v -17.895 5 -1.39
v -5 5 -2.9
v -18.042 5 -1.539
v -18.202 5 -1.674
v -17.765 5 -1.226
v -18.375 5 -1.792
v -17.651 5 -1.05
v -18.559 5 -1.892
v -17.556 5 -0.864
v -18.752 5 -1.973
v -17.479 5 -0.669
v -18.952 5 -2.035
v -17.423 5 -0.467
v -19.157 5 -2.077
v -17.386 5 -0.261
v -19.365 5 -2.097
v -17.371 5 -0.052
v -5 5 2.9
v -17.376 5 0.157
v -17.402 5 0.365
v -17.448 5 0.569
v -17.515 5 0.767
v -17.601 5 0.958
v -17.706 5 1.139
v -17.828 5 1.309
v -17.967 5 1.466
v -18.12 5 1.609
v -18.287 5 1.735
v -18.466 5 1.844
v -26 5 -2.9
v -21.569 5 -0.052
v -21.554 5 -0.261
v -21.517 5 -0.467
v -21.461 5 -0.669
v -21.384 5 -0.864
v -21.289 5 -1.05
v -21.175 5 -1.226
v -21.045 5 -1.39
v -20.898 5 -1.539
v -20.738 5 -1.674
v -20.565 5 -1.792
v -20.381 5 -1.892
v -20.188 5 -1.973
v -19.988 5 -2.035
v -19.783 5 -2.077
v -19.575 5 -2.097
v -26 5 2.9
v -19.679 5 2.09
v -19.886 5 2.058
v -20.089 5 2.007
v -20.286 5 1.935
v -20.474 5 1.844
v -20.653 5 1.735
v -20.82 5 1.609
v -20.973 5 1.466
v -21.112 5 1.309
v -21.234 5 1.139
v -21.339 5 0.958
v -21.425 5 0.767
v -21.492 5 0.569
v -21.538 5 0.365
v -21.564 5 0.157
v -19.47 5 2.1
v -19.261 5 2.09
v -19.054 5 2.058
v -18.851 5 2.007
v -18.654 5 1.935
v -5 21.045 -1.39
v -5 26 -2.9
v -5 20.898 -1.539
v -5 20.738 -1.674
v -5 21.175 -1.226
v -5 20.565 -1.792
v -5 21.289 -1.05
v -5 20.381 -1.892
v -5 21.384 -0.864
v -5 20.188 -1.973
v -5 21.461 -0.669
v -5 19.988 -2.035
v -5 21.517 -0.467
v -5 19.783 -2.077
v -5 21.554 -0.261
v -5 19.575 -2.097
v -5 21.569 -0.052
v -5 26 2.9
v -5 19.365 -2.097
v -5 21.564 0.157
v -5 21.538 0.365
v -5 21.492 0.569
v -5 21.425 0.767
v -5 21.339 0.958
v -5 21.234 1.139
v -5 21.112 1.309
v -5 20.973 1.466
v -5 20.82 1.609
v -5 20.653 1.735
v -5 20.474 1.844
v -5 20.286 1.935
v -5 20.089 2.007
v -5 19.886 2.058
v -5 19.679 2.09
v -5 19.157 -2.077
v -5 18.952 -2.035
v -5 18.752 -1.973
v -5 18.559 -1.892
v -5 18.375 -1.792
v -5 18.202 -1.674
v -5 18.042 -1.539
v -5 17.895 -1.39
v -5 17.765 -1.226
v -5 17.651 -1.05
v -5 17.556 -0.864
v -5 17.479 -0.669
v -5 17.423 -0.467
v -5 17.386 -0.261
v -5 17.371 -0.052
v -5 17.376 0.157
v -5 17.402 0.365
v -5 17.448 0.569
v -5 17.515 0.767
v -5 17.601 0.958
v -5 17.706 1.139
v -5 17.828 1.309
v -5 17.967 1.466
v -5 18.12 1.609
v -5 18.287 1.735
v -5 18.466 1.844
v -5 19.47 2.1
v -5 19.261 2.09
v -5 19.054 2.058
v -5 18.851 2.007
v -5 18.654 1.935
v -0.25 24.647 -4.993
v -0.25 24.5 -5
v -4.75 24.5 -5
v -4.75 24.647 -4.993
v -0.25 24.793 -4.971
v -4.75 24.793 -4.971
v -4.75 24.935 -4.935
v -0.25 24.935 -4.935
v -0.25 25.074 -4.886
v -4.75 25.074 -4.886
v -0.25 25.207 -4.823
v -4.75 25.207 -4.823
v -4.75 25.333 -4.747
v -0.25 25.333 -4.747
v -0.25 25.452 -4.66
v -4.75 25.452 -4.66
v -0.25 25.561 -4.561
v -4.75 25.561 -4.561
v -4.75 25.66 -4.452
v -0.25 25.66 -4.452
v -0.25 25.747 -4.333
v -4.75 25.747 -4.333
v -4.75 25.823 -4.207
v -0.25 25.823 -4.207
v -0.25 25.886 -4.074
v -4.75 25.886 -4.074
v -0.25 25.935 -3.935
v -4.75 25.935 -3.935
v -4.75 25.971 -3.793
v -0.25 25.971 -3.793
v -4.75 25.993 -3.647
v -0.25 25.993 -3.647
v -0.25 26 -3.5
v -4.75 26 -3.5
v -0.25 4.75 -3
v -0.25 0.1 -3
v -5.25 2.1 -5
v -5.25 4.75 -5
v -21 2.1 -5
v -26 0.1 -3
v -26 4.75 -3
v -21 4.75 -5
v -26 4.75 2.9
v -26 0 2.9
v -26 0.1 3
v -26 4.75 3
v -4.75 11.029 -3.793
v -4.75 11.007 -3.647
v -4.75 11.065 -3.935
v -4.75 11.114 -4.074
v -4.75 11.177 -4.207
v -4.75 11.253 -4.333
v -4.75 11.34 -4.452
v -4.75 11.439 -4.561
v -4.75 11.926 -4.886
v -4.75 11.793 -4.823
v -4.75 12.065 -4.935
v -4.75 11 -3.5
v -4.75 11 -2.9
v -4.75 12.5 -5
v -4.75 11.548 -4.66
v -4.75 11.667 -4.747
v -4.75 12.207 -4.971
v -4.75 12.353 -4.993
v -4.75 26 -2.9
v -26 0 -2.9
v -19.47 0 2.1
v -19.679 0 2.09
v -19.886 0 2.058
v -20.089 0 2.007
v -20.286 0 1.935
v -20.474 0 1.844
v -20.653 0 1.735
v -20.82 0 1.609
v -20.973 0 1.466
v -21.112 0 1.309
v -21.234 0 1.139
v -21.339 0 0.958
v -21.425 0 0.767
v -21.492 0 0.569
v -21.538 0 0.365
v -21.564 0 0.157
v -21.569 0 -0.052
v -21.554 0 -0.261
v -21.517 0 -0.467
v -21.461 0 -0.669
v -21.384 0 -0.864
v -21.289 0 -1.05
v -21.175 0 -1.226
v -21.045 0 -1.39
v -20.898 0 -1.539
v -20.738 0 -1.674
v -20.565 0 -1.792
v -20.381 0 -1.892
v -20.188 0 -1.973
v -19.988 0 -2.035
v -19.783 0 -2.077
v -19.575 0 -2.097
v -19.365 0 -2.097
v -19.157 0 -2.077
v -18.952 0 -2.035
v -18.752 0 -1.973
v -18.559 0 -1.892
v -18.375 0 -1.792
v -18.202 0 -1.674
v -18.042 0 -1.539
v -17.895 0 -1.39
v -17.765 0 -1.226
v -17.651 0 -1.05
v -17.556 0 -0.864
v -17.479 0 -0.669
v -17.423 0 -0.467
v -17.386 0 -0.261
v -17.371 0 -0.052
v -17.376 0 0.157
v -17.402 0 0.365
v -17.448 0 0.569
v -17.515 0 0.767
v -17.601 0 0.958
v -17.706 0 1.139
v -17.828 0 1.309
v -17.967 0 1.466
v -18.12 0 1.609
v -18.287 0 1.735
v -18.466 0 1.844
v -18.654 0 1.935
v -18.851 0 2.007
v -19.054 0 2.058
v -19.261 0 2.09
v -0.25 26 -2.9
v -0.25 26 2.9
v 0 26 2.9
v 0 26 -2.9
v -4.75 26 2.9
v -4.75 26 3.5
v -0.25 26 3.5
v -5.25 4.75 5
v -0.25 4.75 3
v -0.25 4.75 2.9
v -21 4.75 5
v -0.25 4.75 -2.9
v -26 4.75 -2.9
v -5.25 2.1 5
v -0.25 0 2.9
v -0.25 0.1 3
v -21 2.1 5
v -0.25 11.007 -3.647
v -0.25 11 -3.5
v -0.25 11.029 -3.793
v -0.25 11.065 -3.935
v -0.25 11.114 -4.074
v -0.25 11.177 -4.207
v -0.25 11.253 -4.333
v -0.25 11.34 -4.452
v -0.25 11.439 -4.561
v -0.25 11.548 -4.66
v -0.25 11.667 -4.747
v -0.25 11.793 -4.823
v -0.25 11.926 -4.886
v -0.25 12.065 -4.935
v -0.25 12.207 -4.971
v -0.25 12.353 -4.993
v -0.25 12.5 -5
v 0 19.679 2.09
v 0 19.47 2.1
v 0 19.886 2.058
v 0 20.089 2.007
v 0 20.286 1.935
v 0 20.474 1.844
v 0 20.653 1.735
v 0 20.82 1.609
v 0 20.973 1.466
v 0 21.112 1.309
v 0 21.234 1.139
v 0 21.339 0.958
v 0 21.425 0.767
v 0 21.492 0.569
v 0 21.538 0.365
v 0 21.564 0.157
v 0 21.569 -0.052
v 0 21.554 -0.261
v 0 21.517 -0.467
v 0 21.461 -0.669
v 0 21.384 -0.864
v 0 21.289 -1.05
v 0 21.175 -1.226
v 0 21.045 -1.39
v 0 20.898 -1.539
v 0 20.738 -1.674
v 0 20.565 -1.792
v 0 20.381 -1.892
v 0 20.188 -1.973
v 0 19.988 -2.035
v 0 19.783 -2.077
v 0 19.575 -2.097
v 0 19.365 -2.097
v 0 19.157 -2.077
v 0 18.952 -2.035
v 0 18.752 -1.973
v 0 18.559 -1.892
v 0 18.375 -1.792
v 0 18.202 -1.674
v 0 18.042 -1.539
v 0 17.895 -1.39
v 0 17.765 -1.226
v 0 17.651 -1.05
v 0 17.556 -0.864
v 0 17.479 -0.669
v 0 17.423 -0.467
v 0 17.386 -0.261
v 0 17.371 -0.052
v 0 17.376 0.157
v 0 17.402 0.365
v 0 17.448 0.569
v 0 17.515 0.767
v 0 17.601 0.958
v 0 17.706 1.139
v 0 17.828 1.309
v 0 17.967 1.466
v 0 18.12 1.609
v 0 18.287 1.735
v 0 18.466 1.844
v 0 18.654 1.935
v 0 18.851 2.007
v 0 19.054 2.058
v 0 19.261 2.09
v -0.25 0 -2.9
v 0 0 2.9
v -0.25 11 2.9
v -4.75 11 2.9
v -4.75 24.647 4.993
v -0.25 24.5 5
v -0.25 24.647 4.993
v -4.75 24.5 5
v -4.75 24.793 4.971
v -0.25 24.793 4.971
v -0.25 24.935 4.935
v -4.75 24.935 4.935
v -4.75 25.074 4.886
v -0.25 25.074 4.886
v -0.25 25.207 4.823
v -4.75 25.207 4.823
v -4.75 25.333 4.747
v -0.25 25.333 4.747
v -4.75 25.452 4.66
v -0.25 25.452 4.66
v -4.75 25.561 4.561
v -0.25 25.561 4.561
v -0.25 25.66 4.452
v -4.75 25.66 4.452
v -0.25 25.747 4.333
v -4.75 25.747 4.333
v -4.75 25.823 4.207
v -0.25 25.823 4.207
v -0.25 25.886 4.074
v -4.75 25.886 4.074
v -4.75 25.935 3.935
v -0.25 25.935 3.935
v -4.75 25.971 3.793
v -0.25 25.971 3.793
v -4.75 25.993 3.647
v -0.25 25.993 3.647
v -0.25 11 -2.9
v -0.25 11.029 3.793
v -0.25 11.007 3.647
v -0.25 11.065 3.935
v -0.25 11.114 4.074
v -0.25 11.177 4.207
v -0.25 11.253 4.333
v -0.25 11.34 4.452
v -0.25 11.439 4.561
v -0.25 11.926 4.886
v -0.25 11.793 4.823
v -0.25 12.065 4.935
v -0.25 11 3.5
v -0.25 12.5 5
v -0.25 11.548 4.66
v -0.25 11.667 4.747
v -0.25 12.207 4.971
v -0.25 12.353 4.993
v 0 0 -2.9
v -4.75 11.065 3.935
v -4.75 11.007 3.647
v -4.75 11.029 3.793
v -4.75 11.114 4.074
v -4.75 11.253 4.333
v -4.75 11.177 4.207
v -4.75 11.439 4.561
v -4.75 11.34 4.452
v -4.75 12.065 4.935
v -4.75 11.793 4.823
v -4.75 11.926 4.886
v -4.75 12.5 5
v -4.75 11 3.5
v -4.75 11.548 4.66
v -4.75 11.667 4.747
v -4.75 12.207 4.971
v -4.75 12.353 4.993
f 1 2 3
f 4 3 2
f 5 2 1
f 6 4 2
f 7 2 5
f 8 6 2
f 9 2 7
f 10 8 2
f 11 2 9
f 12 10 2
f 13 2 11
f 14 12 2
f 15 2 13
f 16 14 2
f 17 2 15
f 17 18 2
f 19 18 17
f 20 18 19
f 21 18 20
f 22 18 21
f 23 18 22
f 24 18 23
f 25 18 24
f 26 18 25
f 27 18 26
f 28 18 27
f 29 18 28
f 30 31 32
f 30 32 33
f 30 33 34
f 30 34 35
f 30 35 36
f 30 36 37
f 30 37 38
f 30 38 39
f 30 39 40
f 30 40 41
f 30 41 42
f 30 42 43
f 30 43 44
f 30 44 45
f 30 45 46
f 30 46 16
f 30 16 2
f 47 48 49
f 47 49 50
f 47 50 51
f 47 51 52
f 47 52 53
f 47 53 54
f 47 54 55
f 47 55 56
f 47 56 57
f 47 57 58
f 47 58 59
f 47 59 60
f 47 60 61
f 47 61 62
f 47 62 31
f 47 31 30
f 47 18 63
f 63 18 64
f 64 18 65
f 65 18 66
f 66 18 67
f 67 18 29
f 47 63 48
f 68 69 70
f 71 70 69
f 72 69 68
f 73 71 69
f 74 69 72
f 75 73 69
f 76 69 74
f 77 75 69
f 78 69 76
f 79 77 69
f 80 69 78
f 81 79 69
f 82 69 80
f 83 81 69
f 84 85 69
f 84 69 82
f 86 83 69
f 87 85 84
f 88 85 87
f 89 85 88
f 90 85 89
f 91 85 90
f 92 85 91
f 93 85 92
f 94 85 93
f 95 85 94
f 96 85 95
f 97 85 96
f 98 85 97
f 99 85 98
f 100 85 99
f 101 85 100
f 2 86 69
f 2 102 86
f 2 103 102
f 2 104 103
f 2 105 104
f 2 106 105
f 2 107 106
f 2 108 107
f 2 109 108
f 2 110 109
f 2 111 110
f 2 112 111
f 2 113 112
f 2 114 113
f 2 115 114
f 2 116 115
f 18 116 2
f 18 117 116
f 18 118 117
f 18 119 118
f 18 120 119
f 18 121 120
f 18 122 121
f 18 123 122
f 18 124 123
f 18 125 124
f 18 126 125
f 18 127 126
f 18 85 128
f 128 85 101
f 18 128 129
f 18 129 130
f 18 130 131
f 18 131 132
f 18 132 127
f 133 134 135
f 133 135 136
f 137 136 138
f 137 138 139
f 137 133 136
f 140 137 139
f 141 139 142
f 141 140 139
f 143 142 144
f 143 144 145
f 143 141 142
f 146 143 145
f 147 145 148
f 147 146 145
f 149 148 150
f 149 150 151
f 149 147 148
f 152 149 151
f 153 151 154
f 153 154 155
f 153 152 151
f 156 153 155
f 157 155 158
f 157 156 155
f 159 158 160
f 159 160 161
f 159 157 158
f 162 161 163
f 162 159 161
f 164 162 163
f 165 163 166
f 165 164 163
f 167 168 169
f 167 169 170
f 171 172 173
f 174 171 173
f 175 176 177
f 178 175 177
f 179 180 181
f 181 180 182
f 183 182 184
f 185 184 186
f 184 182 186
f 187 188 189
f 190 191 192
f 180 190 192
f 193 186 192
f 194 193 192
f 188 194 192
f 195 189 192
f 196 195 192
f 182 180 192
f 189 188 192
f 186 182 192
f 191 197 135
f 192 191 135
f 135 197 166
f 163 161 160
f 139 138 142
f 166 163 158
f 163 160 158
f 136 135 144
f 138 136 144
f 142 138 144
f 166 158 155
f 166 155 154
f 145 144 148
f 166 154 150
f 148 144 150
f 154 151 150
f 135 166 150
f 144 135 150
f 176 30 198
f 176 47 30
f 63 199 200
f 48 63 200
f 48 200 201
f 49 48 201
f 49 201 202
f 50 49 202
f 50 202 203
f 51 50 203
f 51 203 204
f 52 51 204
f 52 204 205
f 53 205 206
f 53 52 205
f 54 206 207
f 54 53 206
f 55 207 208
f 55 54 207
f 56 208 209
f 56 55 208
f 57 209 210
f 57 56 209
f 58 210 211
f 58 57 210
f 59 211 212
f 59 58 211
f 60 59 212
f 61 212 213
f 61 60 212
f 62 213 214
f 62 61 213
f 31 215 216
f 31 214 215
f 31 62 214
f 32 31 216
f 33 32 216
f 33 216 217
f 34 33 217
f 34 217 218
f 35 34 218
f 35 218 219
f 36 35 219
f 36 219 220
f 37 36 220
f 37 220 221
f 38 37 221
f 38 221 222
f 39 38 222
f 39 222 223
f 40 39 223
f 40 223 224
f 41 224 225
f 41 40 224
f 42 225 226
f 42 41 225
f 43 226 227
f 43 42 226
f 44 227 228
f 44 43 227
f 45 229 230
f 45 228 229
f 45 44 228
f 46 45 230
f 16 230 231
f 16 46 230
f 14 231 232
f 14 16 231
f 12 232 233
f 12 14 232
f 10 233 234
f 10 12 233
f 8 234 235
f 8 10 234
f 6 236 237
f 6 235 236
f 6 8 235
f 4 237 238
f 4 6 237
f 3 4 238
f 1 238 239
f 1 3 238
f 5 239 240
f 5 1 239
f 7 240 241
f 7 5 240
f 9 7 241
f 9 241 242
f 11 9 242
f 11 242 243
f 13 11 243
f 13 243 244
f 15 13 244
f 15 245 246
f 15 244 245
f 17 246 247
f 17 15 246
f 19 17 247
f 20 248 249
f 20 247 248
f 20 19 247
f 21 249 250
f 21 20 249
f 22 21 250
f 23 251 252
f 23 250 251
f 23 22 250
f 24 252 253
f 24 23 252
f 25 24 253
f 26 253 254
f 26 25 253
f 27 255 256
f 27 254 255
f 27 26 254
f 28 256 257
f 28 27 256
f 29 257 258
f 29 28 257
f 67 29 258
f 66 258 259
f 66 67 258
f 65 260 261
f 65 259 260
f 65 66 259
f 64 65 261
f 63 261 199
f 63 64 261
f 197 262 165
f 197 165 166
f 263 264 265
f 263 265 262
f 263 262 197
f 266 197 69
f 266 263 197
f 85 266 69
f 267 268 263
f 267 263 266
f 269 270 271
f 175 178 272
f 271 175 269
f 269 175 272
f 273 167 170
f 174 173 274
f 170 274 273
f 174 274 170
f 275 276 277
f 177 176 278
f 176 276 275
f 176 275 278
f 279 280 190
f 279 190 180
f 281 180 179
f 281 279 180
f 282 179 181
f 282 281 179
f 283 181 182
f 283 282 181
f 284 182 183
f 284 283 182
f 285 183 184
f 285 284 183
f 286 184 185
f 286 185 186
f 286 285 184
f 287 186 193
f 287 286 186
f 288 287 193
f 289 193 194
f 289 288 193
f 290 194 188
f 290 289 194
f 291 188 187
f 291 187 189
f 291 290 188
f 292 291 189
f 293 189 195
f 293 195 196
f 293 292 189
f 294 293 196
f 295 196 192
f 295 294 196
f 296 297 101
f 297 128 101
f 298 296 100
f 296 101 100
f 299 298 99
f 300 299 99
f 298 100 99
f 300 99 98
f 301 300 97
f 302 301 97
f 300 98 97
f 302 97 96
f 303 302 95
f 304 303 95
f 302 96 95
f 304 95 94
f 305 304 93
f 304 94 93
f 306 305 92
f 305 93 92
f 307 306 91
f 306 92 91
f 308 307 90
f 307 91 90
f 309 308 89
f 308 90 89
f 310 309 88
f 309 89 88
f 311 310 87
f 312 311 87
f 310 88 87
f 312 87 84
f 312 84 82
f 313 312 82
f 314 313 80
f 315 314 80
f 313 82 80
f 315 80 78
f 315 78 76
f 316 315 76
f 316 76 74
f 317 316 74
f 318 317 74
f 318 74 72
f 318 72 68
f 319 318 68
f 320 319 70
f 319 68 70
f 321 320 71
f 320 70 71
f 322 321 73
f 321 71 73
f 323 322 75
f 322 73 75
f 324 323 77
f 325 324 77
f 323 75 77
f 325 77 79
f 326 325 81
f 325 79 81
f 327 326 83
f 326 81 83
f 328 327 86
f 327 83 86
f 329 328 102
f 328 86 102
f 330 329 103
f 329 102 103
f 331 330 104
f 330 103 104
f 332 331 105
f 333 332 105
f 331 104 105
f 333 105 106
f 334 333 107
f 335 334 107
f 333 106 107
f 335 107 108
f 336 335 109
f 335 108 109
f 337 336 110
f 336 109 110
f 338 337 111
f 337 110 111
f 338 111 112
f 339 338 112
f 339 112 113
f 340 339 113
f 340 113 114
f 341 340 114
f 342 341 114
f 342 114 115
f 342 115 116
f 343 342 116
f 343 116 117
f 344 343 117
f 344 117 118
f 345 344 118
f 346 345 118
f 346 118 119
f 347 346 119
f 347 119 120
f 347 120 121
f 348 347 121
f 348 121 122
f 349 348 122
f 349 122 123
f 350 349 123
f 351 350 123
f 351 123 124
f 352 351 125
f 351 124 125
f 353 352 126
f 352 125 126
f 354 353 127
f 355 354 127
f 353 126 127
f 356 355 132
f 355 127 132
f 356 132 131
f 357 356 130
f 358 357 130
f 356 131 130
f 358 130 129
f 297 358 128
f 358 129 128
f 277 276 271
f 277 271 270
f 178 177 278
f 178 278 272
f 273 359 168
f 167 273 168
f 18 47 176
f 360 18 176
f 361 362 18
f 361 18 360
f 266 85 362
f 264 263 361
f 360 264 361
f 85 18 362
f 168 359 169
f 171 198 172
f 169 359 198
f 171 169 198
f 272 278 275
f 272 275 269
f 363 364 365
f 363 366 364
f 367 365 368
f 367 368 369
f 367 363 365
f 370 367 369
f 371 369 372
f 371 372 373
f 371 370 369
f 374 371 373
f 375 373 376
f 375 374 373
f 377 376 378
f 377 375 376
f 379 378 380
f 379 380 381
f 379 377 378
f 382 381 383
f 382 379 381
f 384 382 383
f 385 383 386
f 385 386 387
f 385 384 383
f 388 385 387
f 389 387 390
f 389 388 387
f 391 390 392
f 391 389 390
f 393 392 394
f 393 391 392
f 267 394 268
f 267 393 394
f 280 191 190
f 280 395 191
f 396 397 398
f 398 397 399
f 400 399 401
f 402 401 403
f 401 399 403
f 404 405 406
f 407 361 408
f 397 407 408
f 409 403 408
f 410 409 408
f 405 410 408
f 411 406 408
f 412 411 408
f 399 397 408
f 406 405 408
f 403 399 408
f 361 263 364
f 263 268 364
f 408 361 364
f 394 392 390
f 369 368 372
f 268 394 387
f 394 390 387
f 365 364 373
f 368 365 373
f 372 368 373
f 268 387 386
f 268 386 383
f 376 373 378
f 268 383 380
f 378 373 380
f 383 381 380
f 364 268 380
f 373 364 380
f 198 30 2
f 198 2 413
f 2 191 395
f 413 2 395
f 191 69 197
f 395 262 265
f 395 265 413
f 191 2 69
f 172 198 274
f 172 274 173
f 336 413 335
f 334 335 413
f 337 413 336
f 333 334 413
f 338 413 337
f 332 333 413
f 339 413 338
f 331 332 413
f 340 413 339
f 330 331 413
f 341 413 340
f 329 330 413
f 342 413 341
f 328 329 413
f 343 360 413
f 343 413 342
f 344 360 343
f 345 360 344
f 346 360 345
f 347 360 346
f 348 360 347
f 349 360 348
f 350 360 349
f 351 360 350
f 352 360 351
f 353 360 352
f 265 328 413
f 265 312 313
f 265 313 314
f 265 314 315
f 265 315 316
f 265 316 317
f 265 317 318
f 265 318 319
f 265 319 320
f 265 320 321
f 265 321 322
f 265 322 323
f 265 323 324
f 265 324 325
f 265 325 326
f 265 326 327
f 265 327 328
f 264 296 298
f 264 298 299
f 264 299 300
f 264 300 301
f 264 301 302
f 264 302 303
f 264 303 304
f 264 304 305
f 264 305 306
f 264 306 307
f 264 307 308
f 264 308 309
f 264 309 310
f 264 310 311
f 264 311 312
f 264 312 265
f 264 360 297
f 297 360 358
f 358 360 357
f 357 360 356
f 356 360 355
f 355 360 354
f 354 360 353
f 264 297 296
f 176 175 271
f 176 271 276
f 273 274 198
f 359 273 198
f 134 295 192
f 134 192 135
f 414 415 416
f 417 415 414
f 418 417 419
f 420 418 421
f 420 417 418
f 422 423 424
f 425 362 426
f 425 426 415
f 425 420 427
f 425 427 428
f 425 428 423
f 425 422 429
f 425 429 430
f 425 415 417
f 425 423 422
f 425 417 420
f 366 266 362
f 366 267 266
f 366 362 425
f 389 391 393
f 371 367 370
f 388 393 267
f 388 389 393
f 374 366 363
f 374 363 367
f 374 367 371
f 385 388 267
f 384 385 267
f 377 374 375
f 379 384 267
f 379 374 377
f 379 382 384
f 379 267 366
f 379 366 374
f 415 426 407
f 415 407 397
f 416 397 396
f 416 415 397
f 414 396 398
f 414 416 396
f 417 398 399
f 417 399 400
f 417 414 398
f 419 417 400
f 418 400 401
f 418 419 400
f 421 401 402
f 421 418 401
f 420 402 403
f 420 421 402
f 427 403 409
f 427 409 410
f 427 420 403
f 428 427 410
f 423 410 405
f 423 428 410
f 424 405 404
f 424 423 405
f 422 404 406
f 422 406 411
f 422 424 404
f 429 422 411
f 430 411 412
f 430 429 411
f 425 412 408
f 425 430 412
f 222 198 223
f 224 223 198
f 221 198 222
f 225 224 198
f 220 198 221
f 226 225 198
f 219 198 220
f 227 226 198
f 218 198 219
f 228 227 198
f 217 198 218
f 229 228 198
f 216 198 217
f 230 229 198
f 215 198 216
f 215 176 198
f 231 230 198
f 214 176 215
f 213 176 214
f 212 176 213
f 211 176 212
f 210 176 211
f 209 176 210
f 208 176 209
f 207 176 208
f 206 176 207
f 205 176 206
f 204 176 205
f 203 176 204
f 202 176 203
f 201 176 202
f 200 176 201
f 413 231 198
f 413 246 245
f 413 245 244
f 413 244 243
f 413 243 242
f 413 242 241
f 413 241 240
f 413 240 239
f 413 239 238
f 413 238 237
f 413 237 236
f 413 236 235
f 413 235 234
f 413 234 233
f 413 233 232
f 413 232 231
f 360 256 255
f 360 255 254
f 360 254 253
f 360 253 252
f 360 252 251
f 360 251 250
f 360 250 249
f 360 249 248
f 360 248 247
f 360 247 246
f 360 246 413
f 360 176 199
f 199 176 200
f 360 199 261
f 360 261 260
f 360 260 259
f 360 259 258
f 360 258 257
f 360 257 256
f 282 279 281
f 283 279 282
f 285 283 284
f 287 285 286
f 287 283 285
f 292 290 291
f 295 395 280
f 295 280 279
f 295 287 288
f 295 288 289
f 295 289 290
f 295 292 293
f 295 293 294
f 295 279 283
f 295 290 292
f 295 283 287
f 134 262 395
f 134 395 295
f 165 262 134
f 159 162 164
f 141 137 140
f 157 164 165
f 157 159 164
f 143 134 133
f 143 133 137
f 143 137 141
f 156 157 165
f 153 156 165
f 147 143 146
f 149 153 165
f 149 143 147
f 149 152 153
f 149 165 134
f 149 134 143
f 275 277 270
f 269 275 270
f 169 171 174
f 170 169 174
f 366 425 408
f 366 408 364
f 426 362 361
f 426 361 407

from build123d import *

# Parameters (mm, degrees)
EXTRUDE_1_DEPTH   = 2.9
EXTRUDE_2_DEPTH   = 25.75
EXTRUDE_2_2_DEPTH = 25.75
CHAMFER_1_SIZE    = 5
CHAMFER_1_SIZE2   = 2
CHAMFER_2_SIZE    = 5
CHAMFER_2_SIZE2   = 2
CHAMFER_3_SIZE    = 2
CHAMFER_3_SIZE2   = 5
CHAMFER_4_SIZE    = 2
CHAMFER_4_SIZE2   = 5
EXTRUDE_3_DEPTH   = 2.25


with BuildPart() as part:
    # 草图1 → 凸台-拉伸1 (new, symmetric)
    with BuildSketch(Plane.XY):
        Polygon((-26, 0), (0, 0), (0, 26), (-5, 26), (-5, 5), (-26, 5), align=None)
    extrude(amount=EXTRUDE_1_DEPTH, both=True)

    # 草图4 → 凸台-拉伸3 (add, symmetric)
    with BuildSketch(Plane.ZY.offset(2.5)):
        with BuildLine():
            Line((-2.9, 11), (-3.5, 11))
            ThreePointArc((-3.5, 11), (-4.560660172, 11.439339828), (-5, 12.5))
            Line((-5, 12.5), (-5, 24.5))
            ThreePointArc((-5, 24.5), (-4.560660172, 25.560660172), (-3.5, 26))
            Line((-3.5, 26), (-2.9, 26))
            Line((-2.9, 26), (-2.9, 11))
        make_face()
        with BuildLine():
            Line((2.9, 26), (2.9, 11))
            Line((2.9, 11), (3.5, 11))
            ThreePointArc((3.5, 11), (4.560660172, 11.439339828), (5, 12.5))
            Line((5, 12.5), (5, 24.5))
            ThreePointArc((5, 24.5), (4.560660172, 25.560660172), (3.5, 26))
            Line((3.5, 26), (2.9, 26))
        make_face()
    extrude(amount=EXTRUDE_3_DEPTH, both=True)

    # 草图6 → M5 螺纹孔1 (revolve, cut)
    with BuildSketch(Plane(origin=(-19.47, 5, 0), x_dir=(0, 0, 1), z_dir=(1, 0, 0))):
        Polygon((0, 0), (0, 28.6618073), (2.1, 27.4), (2.1, 0), align=None)
    hole_wizard_m5_1 = revolve(axis=Axis((-19.47, 11.35, 0), (0, -1, 0)), mode=Mode.SUBTRACT)

    # 镜向1: M5 螺纹孔1 across plane
    add(hole_wizard_m5_1.mirror(Plane(origin=(0, 0, 0), x_dir=(0, 0, 1), z_dir=(-0.7071067811865477, -0.7071067811865475, 0))), mode=Mode.SUBTRACT)


with BuildPart() as body_2:
    # 草图3 → 凸台-拉伸2 (new body)
    with BuildSketch(Plane.ZY.offset(26)):
        Polygon((-2.9, 0), (-5, 2.1), (-5, 4.75), (-2.9, 4.75), align=None)
    extrude(amount=-EXTRUDE_2_DEPTH)

    # 倒角1
    chamfer_1_edges = [body_2.edges().sort_by_distance(p)[0] for p in [
        (-26, 3.425, -5),
    ]]
    chamfer_1_side = [body_2.faces().sort_by_distance(p)[0] for p in [
        (-13.125, 3.425, -5),
    ]]
    chamfer(chamfer_1_edges, length=CHAMFER_1_SIZE, length2=CHAMFER_1_SIZE2, reference=chamfer_1_side[0])

    # 倒角4
    chamfer_4_edges = [body_2.edges().sort_by_distance(p)[0] for p in [
        (-0.25, 3.425, -5),
    ]]
    chamfer_4_side = [body_2.faces().sort_by_distance(p)[0] for p in [
        (-0.25, 2.850337838, -3.850675676),
    ]]
    chamfer(chamfer_4_edges, length=CHAMFER_4_SIZE, length2=CHAMFER_4_SIZE2, reference=chamfer_4_side[0])


with BuildPart() as body_3:
    # 草图3 → Extrude 2 2 (new body)
    with BuildSketch(Plane.ZY.offset(26)):
        Polygon((2.9, 4.75), (2.9, 0), (5, 2.1), (5, 4.75), align=None)
    extrude(amount=-EXTRUDE_2_2_DEPTH)

    # 倒角2
    chamfer_2_edges = [body_3.edges().sort_by_distance(p)[0] for p in [
        (-26, 3.425, 5),
    ]]
    chamfer_2_side = [body_3.faces().sort_by_distance(p)[0] for p in [
        (-13.125, 3.425, 5),
    ]]
    chamfer(chamfer_2_edges, length=CHAMFER_2_SIZE, length2=CHAMFER_2_SIZE2, reference=chamfer_2_side[0])

    # 倒角3
    chamfer_3_edges = [body_3.edges().sort_by_distance(p)[0] for p in [
        (-0.25, 3.425, 5),
    ]]
    chamfer_3_side = [body_3.faces().sort_by_distance(p)[0] for p in [
        (-0.25, 2.850337838, 3.850675676),
    ]]
    chamfer(chamfer_3_edges, length=CHAMFER_3_SIZE, length2=CHAMFER_3_SIZE2, reference=chamfer_3_side[0])


solid = Compound([part.part, body_2.part, body_3.part])
